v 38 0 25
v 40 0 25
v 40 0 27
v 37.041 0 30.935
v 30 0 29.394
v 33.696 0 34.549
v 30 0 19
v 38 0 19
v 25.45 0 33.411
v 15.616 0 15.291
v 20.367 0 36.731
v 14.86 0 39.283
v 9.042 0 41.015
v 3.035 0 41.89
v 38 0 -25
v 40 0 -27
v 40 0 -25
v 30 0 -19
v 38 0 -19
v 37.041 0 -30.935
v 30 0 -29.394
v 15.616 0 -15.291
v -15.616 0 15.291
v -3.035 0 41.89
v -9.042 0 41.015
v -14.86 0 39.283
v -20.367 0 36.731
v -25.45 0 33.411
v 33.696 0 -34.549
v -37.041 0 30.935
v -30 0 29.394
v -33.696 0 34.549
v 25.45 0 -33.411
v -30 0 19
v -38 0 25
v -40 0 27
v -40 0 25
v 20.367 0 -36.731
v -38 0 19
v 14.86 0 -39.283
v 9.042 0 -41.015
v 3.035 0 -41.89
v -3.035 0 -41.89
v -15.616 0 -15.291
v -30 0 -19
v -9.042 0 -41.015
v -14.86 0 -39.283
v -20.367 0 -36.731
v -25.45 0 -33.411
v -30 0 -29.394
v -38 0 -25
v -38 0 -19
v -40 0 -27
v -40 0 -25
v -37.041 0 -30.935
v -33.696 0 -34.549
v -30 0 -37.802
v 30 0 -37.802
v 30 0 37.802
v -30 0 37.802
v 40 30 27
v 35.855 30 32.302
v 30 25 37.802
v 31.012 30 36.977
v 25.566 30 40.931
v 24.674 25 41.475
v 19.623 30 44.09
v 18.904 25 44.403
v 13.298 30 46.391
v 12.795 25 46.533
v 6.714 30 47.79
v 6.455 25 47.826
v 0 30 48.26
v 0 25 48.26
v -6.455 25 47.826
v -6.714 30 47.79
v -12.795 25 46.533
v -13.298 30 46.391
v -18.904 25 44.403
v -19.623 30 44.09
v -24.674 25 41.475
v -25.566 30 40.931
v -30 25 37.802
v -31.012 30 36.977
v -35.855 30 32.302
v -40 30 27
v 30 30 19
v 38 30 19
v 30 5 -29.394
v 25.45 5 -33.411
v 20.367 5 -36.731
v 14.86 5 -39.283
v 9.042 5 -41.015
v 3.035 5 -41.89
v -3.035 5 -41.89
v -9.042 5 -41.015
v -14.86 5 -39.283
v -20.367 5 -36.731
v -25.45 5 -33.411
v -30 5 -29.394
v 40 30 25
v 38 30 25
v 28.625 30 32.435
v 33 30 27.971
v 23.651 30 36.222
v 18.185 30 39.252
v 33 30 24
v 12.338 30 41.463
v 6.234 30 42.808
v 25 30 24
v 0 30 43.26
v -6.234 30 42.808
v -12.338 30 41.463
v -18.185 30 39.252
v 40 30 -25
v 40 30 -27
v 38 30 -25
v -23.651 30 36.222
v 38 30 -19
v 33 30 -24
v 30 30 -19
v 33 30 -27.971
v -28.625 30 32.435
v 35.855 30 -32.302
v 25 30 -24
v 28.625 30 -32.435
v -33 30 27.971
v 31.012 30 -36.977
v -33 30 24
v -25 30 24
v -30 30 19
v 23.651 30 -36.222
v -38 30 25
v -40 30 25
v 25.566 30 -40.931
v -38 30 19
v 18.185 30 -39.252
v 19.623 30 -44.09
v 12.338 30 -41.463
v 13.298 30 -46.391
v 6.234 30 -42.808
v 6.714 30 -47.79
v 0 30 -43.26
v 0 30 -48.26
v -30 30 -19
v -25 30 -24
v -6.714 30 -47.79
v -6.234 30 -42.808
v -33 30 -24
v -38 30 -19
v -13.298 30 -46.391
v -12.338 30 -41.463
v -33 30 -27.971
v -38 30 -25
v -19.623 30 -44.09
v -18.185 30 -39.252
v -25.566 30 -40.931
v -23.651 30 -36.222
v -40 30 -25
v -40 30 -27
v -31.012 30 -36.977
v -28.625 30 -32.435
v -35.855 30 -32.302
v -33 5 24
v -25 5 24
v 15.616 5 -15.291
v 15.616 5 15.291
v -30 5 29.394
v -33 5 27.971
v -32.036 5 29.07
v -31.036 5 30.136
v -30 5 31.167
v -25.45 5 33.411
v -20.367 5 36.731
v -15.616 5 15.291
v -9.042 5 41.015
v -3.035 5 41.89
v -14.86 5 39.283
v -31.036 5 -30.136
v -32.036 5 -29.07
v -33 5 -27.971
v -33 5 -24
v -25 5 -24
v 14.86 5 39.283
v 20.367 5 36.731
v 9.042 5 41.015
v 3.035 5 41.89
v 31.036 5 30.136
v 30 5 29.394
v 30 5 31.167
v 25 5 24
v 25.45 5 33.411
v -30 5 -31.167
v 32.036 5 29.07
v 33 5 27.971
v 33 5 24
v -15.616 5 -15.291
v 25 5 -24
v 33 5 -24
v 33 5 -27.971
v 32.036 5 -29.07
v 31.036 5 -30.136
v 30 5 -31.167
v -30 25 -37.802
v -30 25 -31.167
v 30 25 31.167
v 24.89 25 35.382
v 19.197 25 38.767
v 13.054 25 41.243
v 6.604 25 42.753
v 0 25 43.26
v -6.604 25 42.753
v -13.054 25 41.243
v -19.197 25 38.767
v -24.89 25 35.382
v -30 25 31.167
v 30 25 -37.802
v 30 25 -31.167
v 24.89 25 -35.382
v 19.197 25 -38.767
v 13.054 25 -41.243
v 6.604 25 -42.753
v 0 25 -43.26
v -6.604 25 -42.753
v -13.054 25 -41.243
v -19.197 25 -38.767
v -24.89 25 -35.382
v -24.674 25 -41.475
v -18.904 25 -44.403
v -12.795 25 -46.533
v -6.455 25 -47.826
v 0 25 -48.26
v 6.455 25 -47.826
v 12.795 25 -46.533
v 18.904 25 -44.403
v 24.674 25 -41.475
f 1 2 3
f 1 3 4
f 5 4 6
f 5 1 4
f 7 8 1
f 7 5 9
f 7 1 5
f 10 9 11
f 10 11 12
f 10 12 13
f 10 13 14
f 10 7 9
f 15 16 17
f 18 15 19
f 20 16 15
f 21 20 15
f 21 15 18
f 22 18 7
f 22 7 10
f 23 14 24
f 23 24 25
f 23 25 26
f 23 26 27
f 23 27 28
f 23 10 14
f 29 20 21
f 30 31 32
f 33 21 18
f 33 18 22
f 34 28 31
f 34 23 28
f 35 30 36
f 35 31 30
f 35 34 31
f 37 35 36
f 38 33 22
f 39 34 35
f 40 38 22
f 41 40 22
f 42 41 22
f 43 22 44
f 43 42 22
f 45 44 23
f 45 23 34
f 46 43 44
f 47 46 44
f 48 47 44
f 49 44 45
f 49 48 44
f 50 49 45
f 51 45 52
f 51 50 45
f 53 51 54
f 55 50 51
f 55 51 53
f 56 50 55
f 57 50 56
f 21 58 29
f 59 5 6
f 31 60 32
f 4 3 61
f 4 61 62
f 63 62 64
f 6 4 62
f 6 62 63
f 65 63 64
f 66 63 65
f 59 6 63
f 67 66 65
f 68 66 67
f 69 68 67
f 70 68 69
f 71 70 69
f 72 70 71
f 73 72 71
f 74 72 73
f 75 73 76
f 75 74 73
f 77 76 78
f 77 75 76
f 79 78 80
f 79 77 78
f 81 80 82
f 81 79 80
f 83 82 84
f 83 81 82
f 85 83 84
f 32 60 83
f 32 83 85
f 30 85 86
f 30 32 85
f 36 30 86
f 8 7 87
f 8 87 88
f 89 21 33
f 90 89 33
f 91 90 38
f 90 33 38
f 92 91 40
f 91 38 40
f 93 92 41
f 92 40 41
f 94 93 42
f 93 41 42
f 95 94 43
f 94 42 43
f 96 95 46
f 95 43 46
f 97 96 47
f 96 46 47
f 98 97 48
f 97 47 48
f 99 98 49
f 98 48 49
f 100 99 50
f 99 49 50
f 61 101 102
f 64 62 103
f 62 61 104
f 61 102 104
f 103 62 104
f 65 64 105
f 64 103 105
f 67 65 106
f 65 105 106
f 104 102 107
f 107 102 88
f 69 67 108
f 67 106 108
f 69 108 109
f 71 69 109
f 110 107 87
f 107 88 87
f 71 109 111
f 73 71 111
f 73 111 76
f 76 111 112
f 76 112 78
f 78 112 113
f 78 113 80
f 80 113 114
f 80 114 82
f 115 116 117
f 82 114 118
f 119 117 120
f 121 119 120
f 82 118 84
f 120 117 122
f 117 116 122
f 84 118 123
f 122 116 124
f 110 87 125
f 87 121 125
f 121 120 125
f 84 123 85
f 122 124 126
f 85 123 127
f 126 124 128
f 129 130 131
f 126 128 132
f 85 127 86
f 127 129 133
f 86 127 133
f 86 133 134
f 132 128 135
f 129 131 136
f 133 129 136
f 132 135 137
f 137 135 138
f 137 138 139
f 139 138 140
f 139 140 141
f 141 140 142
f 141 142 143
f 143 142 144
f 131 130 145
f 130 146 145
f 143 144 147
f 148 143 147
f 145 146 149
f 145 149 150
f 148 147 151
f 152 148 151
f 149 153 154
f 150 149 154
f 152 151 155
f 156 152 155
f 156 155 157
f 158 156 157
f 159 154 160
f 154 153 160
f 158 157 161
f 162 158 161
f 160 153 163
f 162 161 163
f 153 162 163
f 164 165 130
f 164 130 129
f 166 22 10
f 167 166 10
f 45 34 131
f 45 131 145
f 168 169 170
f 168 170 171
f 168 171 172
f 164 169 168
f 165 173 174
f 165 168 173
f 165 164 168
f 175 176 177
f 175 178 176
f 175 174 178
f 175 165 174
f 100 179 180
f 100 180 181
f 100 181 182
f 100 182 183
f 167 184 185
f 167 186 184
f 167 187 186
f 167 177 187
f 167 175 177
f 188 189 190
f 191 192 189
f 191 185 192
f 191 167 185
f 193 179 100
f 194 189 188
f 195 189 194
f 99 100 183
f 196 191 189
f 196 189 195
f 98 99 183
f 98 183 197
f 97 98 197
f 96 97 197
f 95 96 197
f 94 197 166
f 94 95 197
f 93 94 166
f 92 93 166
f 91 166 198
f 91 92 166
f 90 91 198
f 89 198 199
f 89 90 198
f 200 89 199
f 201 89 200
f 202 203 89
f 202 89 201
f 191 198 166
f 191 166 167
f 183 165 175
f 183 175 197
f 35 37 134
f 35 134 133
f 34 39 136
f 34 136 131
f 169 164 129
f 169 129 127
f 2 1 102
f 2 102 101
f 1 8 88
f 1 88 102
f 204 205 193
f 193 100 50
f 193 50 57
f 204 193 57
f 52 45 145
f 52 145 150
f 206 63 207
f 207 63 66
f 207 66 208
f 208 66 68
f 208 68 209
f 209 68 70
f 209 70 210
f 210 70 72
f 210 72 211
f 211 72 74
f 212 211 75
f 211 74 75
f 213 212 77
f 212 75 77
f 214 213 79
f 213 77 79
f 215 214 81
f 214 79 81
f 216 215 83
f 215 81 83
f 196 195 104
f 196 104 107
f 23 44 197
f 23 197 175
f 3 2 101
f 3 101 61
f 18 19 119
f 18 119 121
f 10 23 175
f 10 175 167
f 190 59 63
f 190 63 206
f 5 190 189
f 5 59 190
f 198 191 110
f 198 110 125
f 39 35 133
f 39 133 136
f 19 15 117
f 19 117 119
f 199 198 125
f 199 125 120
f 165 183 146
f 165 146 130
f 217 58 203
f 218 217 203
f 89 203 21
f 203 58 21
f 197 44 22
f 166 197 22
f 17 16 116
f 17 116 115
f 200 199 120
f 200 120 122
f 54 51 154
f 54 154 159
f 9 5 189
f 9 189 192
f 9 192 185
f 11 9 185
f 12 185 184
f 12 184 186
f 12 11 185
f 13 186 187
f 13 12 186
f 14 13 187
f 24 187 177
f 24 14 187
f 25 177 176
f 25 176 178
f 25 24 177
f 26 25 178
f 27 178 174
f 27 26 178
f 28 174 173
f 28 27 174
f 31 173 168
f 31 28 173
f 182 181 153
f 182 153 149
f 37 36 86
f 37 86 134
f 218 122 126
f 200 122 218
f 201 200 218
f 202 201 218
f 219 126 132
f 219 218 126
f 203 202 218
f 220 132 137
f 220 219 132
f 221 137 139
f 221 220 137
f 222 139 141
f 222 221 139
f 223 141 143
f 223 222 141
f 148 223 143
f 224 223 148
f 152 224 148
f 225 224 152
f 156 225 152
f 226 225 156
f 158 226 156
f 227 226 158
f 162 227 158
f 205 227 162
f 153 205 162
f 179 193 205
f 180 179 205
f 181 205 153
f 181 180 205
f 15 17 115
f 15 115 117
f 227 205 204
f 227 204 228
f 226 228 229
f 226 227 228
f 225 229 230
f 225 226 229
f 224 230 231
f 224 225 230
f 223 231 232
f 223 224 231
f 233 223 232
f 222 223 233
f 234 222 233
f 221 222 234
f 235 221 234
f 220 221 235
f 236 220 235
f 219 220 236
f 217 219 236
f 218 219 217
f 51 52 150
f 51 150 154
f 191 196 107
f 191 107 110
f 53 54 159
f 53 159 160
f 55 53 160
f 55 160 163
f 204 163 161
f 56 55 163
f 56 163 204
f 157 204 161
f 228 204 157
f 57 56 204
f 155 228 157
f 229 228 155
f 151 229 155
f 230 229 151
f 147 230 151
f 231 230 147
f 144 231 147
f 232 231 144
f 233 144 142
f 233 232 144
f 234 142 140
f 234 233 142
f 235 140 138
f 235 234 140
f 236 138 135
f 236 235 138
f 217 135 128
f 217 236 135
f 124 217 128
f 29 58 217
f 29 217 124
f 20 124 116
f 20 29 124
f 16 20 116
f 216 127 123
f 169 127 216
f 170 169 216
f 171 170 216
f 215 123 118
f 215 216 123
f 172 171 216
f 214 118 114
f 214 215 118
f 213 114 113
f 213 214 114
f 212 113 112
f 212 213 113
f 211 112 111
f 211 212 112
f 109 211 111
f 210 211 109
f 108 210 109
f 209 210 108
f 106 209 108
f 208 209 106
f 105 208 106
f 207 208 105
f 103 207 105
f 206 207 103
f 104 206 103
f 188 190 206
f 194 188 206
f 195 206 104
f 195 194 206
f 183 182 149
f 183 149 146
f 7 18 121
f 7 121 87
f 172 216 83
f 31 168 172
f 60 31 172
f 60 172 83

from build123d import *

# Parameters (mm, degrees)
EXTRUDE_1_DEPTH     = 30
SHELL_START         = 5
SHELL_1_DEPTH       = 25
SKETCH_3_W          = 31.232058984
SKETCH_3_H          = 30.58107444
CUT_EXTRUDE_1_DEPTH = 25


# Read off the part's stored shape, not the designer's step: 抽壳1
with BuildPart() as part:
    # 草图1 → 凸台-拉伸1 (new body)
    with BuildSketch(Plane(origin=(0, 0, 0), x_dir=(1, 0, 0), z_dir=(0, 1, 0))):
        with BuildLine():
            Line((-40, -27), (-40, -25))
            Line((-40, -25), (-38, -25))
            Line((-38, -25), (-38, -19))
            Line((-38, -19), (-30, -19))
            Line((-30, -19), (-30, 19))
            Line((-30, 19), (-38, 19))
            Line((-38, 19), (-38, 25))
            Line((-38, 25), (-40, 25))
            Line((-40, 25), (-40, 27))
            ThreePointArc((-40, 27), (0, 48.259714048), (40, 27))
            Line((40, 27), (40, 25))
            Line((40, 25), (38, 25))
            Line((38, 25), (38, 19))
            Line((38, 19), (30, 19))
            Line((30, 19), (30, -19))
            Line((30, -19), (38, -19))
            Line((38, -19), (38, -25))
            Line((38, -25), (40, -25))
            Line((40, -25), (40, -27))
            ThreePointArc((40, -27), (0, -48.259714048), (-40, -27))
        make_face()
    extrude(amount=EXTRUDE_1_DEPTH)

    # 抽壳1 outline → 抽壳1 (cut)
    with BuildSketch(Plane(origin=(0, 0, 0), x_dir=(1, 0, 0), z_dir=(0, 1, 0)).offset(SHELL_START)):
        with BuildLine():
            Line((-33, -24), (-33, -27.971465094))
            ThreePointArc((-33, -27.971465094), (0, -43.259714048), (33, -27.971465094))
            Line((33, -27.971465094), (33, -24))
            Line((33, -24), (25, -24))
            Line((25, -24), (25, 24))
            Line((25, 24), (33, 24))
            Line((33, 24), (33, 27.971465094))
            ThreePointArc((33, 27.971465094), (0, 43.259714048), (-33, 27.971465094))
            Line((-33, 27.971465094), (-33, 24))
            Line((-33, 24), (-25, 24))
            Line((-25, 24), (-25, -24))
            Line((-25, -24), (-33, -24))
        make_face()
    extrude(amount=SHELL_1_DEPTH, mode=Mode.SUBTRACT)

    # 草图3 → 切除-拉伸1 (cut)
    with BuildSketch(Plane.XZ):
        with BuildLine():
            Line((-30, 29.393876913), (-30, 37.802116343))
            ThreePointArc((-30, 37.802116343), (0, 48.259714048), (30, 37.802116343))
            Line((30, 37.802116343), (30, 29.393876913))
            ThreePointArc((30, 29.393876913), (0, 42), (-30, 29.393876913))
        make_face()
        with BuildLine():
            Line((-30, -29.393876913), (-30, -37.802116343))
            ThreePointArc((-30, -37.802116343), (0, -48.259714048), (30, -37.802116343))
            Line((30, -37.802116343), (30, -29.393876913))
            ThreePointArc((30, -29.393876913), (0, -42), (-30, -29.393876913))
        make_face()
        Rectangle(SKETCH_3_W, SKETCH_3_H)
    extrude(amount=-CUT_EXTRUDE_1_DEPTH, mode=Mode.SUBTRACT)


solid = part.part
